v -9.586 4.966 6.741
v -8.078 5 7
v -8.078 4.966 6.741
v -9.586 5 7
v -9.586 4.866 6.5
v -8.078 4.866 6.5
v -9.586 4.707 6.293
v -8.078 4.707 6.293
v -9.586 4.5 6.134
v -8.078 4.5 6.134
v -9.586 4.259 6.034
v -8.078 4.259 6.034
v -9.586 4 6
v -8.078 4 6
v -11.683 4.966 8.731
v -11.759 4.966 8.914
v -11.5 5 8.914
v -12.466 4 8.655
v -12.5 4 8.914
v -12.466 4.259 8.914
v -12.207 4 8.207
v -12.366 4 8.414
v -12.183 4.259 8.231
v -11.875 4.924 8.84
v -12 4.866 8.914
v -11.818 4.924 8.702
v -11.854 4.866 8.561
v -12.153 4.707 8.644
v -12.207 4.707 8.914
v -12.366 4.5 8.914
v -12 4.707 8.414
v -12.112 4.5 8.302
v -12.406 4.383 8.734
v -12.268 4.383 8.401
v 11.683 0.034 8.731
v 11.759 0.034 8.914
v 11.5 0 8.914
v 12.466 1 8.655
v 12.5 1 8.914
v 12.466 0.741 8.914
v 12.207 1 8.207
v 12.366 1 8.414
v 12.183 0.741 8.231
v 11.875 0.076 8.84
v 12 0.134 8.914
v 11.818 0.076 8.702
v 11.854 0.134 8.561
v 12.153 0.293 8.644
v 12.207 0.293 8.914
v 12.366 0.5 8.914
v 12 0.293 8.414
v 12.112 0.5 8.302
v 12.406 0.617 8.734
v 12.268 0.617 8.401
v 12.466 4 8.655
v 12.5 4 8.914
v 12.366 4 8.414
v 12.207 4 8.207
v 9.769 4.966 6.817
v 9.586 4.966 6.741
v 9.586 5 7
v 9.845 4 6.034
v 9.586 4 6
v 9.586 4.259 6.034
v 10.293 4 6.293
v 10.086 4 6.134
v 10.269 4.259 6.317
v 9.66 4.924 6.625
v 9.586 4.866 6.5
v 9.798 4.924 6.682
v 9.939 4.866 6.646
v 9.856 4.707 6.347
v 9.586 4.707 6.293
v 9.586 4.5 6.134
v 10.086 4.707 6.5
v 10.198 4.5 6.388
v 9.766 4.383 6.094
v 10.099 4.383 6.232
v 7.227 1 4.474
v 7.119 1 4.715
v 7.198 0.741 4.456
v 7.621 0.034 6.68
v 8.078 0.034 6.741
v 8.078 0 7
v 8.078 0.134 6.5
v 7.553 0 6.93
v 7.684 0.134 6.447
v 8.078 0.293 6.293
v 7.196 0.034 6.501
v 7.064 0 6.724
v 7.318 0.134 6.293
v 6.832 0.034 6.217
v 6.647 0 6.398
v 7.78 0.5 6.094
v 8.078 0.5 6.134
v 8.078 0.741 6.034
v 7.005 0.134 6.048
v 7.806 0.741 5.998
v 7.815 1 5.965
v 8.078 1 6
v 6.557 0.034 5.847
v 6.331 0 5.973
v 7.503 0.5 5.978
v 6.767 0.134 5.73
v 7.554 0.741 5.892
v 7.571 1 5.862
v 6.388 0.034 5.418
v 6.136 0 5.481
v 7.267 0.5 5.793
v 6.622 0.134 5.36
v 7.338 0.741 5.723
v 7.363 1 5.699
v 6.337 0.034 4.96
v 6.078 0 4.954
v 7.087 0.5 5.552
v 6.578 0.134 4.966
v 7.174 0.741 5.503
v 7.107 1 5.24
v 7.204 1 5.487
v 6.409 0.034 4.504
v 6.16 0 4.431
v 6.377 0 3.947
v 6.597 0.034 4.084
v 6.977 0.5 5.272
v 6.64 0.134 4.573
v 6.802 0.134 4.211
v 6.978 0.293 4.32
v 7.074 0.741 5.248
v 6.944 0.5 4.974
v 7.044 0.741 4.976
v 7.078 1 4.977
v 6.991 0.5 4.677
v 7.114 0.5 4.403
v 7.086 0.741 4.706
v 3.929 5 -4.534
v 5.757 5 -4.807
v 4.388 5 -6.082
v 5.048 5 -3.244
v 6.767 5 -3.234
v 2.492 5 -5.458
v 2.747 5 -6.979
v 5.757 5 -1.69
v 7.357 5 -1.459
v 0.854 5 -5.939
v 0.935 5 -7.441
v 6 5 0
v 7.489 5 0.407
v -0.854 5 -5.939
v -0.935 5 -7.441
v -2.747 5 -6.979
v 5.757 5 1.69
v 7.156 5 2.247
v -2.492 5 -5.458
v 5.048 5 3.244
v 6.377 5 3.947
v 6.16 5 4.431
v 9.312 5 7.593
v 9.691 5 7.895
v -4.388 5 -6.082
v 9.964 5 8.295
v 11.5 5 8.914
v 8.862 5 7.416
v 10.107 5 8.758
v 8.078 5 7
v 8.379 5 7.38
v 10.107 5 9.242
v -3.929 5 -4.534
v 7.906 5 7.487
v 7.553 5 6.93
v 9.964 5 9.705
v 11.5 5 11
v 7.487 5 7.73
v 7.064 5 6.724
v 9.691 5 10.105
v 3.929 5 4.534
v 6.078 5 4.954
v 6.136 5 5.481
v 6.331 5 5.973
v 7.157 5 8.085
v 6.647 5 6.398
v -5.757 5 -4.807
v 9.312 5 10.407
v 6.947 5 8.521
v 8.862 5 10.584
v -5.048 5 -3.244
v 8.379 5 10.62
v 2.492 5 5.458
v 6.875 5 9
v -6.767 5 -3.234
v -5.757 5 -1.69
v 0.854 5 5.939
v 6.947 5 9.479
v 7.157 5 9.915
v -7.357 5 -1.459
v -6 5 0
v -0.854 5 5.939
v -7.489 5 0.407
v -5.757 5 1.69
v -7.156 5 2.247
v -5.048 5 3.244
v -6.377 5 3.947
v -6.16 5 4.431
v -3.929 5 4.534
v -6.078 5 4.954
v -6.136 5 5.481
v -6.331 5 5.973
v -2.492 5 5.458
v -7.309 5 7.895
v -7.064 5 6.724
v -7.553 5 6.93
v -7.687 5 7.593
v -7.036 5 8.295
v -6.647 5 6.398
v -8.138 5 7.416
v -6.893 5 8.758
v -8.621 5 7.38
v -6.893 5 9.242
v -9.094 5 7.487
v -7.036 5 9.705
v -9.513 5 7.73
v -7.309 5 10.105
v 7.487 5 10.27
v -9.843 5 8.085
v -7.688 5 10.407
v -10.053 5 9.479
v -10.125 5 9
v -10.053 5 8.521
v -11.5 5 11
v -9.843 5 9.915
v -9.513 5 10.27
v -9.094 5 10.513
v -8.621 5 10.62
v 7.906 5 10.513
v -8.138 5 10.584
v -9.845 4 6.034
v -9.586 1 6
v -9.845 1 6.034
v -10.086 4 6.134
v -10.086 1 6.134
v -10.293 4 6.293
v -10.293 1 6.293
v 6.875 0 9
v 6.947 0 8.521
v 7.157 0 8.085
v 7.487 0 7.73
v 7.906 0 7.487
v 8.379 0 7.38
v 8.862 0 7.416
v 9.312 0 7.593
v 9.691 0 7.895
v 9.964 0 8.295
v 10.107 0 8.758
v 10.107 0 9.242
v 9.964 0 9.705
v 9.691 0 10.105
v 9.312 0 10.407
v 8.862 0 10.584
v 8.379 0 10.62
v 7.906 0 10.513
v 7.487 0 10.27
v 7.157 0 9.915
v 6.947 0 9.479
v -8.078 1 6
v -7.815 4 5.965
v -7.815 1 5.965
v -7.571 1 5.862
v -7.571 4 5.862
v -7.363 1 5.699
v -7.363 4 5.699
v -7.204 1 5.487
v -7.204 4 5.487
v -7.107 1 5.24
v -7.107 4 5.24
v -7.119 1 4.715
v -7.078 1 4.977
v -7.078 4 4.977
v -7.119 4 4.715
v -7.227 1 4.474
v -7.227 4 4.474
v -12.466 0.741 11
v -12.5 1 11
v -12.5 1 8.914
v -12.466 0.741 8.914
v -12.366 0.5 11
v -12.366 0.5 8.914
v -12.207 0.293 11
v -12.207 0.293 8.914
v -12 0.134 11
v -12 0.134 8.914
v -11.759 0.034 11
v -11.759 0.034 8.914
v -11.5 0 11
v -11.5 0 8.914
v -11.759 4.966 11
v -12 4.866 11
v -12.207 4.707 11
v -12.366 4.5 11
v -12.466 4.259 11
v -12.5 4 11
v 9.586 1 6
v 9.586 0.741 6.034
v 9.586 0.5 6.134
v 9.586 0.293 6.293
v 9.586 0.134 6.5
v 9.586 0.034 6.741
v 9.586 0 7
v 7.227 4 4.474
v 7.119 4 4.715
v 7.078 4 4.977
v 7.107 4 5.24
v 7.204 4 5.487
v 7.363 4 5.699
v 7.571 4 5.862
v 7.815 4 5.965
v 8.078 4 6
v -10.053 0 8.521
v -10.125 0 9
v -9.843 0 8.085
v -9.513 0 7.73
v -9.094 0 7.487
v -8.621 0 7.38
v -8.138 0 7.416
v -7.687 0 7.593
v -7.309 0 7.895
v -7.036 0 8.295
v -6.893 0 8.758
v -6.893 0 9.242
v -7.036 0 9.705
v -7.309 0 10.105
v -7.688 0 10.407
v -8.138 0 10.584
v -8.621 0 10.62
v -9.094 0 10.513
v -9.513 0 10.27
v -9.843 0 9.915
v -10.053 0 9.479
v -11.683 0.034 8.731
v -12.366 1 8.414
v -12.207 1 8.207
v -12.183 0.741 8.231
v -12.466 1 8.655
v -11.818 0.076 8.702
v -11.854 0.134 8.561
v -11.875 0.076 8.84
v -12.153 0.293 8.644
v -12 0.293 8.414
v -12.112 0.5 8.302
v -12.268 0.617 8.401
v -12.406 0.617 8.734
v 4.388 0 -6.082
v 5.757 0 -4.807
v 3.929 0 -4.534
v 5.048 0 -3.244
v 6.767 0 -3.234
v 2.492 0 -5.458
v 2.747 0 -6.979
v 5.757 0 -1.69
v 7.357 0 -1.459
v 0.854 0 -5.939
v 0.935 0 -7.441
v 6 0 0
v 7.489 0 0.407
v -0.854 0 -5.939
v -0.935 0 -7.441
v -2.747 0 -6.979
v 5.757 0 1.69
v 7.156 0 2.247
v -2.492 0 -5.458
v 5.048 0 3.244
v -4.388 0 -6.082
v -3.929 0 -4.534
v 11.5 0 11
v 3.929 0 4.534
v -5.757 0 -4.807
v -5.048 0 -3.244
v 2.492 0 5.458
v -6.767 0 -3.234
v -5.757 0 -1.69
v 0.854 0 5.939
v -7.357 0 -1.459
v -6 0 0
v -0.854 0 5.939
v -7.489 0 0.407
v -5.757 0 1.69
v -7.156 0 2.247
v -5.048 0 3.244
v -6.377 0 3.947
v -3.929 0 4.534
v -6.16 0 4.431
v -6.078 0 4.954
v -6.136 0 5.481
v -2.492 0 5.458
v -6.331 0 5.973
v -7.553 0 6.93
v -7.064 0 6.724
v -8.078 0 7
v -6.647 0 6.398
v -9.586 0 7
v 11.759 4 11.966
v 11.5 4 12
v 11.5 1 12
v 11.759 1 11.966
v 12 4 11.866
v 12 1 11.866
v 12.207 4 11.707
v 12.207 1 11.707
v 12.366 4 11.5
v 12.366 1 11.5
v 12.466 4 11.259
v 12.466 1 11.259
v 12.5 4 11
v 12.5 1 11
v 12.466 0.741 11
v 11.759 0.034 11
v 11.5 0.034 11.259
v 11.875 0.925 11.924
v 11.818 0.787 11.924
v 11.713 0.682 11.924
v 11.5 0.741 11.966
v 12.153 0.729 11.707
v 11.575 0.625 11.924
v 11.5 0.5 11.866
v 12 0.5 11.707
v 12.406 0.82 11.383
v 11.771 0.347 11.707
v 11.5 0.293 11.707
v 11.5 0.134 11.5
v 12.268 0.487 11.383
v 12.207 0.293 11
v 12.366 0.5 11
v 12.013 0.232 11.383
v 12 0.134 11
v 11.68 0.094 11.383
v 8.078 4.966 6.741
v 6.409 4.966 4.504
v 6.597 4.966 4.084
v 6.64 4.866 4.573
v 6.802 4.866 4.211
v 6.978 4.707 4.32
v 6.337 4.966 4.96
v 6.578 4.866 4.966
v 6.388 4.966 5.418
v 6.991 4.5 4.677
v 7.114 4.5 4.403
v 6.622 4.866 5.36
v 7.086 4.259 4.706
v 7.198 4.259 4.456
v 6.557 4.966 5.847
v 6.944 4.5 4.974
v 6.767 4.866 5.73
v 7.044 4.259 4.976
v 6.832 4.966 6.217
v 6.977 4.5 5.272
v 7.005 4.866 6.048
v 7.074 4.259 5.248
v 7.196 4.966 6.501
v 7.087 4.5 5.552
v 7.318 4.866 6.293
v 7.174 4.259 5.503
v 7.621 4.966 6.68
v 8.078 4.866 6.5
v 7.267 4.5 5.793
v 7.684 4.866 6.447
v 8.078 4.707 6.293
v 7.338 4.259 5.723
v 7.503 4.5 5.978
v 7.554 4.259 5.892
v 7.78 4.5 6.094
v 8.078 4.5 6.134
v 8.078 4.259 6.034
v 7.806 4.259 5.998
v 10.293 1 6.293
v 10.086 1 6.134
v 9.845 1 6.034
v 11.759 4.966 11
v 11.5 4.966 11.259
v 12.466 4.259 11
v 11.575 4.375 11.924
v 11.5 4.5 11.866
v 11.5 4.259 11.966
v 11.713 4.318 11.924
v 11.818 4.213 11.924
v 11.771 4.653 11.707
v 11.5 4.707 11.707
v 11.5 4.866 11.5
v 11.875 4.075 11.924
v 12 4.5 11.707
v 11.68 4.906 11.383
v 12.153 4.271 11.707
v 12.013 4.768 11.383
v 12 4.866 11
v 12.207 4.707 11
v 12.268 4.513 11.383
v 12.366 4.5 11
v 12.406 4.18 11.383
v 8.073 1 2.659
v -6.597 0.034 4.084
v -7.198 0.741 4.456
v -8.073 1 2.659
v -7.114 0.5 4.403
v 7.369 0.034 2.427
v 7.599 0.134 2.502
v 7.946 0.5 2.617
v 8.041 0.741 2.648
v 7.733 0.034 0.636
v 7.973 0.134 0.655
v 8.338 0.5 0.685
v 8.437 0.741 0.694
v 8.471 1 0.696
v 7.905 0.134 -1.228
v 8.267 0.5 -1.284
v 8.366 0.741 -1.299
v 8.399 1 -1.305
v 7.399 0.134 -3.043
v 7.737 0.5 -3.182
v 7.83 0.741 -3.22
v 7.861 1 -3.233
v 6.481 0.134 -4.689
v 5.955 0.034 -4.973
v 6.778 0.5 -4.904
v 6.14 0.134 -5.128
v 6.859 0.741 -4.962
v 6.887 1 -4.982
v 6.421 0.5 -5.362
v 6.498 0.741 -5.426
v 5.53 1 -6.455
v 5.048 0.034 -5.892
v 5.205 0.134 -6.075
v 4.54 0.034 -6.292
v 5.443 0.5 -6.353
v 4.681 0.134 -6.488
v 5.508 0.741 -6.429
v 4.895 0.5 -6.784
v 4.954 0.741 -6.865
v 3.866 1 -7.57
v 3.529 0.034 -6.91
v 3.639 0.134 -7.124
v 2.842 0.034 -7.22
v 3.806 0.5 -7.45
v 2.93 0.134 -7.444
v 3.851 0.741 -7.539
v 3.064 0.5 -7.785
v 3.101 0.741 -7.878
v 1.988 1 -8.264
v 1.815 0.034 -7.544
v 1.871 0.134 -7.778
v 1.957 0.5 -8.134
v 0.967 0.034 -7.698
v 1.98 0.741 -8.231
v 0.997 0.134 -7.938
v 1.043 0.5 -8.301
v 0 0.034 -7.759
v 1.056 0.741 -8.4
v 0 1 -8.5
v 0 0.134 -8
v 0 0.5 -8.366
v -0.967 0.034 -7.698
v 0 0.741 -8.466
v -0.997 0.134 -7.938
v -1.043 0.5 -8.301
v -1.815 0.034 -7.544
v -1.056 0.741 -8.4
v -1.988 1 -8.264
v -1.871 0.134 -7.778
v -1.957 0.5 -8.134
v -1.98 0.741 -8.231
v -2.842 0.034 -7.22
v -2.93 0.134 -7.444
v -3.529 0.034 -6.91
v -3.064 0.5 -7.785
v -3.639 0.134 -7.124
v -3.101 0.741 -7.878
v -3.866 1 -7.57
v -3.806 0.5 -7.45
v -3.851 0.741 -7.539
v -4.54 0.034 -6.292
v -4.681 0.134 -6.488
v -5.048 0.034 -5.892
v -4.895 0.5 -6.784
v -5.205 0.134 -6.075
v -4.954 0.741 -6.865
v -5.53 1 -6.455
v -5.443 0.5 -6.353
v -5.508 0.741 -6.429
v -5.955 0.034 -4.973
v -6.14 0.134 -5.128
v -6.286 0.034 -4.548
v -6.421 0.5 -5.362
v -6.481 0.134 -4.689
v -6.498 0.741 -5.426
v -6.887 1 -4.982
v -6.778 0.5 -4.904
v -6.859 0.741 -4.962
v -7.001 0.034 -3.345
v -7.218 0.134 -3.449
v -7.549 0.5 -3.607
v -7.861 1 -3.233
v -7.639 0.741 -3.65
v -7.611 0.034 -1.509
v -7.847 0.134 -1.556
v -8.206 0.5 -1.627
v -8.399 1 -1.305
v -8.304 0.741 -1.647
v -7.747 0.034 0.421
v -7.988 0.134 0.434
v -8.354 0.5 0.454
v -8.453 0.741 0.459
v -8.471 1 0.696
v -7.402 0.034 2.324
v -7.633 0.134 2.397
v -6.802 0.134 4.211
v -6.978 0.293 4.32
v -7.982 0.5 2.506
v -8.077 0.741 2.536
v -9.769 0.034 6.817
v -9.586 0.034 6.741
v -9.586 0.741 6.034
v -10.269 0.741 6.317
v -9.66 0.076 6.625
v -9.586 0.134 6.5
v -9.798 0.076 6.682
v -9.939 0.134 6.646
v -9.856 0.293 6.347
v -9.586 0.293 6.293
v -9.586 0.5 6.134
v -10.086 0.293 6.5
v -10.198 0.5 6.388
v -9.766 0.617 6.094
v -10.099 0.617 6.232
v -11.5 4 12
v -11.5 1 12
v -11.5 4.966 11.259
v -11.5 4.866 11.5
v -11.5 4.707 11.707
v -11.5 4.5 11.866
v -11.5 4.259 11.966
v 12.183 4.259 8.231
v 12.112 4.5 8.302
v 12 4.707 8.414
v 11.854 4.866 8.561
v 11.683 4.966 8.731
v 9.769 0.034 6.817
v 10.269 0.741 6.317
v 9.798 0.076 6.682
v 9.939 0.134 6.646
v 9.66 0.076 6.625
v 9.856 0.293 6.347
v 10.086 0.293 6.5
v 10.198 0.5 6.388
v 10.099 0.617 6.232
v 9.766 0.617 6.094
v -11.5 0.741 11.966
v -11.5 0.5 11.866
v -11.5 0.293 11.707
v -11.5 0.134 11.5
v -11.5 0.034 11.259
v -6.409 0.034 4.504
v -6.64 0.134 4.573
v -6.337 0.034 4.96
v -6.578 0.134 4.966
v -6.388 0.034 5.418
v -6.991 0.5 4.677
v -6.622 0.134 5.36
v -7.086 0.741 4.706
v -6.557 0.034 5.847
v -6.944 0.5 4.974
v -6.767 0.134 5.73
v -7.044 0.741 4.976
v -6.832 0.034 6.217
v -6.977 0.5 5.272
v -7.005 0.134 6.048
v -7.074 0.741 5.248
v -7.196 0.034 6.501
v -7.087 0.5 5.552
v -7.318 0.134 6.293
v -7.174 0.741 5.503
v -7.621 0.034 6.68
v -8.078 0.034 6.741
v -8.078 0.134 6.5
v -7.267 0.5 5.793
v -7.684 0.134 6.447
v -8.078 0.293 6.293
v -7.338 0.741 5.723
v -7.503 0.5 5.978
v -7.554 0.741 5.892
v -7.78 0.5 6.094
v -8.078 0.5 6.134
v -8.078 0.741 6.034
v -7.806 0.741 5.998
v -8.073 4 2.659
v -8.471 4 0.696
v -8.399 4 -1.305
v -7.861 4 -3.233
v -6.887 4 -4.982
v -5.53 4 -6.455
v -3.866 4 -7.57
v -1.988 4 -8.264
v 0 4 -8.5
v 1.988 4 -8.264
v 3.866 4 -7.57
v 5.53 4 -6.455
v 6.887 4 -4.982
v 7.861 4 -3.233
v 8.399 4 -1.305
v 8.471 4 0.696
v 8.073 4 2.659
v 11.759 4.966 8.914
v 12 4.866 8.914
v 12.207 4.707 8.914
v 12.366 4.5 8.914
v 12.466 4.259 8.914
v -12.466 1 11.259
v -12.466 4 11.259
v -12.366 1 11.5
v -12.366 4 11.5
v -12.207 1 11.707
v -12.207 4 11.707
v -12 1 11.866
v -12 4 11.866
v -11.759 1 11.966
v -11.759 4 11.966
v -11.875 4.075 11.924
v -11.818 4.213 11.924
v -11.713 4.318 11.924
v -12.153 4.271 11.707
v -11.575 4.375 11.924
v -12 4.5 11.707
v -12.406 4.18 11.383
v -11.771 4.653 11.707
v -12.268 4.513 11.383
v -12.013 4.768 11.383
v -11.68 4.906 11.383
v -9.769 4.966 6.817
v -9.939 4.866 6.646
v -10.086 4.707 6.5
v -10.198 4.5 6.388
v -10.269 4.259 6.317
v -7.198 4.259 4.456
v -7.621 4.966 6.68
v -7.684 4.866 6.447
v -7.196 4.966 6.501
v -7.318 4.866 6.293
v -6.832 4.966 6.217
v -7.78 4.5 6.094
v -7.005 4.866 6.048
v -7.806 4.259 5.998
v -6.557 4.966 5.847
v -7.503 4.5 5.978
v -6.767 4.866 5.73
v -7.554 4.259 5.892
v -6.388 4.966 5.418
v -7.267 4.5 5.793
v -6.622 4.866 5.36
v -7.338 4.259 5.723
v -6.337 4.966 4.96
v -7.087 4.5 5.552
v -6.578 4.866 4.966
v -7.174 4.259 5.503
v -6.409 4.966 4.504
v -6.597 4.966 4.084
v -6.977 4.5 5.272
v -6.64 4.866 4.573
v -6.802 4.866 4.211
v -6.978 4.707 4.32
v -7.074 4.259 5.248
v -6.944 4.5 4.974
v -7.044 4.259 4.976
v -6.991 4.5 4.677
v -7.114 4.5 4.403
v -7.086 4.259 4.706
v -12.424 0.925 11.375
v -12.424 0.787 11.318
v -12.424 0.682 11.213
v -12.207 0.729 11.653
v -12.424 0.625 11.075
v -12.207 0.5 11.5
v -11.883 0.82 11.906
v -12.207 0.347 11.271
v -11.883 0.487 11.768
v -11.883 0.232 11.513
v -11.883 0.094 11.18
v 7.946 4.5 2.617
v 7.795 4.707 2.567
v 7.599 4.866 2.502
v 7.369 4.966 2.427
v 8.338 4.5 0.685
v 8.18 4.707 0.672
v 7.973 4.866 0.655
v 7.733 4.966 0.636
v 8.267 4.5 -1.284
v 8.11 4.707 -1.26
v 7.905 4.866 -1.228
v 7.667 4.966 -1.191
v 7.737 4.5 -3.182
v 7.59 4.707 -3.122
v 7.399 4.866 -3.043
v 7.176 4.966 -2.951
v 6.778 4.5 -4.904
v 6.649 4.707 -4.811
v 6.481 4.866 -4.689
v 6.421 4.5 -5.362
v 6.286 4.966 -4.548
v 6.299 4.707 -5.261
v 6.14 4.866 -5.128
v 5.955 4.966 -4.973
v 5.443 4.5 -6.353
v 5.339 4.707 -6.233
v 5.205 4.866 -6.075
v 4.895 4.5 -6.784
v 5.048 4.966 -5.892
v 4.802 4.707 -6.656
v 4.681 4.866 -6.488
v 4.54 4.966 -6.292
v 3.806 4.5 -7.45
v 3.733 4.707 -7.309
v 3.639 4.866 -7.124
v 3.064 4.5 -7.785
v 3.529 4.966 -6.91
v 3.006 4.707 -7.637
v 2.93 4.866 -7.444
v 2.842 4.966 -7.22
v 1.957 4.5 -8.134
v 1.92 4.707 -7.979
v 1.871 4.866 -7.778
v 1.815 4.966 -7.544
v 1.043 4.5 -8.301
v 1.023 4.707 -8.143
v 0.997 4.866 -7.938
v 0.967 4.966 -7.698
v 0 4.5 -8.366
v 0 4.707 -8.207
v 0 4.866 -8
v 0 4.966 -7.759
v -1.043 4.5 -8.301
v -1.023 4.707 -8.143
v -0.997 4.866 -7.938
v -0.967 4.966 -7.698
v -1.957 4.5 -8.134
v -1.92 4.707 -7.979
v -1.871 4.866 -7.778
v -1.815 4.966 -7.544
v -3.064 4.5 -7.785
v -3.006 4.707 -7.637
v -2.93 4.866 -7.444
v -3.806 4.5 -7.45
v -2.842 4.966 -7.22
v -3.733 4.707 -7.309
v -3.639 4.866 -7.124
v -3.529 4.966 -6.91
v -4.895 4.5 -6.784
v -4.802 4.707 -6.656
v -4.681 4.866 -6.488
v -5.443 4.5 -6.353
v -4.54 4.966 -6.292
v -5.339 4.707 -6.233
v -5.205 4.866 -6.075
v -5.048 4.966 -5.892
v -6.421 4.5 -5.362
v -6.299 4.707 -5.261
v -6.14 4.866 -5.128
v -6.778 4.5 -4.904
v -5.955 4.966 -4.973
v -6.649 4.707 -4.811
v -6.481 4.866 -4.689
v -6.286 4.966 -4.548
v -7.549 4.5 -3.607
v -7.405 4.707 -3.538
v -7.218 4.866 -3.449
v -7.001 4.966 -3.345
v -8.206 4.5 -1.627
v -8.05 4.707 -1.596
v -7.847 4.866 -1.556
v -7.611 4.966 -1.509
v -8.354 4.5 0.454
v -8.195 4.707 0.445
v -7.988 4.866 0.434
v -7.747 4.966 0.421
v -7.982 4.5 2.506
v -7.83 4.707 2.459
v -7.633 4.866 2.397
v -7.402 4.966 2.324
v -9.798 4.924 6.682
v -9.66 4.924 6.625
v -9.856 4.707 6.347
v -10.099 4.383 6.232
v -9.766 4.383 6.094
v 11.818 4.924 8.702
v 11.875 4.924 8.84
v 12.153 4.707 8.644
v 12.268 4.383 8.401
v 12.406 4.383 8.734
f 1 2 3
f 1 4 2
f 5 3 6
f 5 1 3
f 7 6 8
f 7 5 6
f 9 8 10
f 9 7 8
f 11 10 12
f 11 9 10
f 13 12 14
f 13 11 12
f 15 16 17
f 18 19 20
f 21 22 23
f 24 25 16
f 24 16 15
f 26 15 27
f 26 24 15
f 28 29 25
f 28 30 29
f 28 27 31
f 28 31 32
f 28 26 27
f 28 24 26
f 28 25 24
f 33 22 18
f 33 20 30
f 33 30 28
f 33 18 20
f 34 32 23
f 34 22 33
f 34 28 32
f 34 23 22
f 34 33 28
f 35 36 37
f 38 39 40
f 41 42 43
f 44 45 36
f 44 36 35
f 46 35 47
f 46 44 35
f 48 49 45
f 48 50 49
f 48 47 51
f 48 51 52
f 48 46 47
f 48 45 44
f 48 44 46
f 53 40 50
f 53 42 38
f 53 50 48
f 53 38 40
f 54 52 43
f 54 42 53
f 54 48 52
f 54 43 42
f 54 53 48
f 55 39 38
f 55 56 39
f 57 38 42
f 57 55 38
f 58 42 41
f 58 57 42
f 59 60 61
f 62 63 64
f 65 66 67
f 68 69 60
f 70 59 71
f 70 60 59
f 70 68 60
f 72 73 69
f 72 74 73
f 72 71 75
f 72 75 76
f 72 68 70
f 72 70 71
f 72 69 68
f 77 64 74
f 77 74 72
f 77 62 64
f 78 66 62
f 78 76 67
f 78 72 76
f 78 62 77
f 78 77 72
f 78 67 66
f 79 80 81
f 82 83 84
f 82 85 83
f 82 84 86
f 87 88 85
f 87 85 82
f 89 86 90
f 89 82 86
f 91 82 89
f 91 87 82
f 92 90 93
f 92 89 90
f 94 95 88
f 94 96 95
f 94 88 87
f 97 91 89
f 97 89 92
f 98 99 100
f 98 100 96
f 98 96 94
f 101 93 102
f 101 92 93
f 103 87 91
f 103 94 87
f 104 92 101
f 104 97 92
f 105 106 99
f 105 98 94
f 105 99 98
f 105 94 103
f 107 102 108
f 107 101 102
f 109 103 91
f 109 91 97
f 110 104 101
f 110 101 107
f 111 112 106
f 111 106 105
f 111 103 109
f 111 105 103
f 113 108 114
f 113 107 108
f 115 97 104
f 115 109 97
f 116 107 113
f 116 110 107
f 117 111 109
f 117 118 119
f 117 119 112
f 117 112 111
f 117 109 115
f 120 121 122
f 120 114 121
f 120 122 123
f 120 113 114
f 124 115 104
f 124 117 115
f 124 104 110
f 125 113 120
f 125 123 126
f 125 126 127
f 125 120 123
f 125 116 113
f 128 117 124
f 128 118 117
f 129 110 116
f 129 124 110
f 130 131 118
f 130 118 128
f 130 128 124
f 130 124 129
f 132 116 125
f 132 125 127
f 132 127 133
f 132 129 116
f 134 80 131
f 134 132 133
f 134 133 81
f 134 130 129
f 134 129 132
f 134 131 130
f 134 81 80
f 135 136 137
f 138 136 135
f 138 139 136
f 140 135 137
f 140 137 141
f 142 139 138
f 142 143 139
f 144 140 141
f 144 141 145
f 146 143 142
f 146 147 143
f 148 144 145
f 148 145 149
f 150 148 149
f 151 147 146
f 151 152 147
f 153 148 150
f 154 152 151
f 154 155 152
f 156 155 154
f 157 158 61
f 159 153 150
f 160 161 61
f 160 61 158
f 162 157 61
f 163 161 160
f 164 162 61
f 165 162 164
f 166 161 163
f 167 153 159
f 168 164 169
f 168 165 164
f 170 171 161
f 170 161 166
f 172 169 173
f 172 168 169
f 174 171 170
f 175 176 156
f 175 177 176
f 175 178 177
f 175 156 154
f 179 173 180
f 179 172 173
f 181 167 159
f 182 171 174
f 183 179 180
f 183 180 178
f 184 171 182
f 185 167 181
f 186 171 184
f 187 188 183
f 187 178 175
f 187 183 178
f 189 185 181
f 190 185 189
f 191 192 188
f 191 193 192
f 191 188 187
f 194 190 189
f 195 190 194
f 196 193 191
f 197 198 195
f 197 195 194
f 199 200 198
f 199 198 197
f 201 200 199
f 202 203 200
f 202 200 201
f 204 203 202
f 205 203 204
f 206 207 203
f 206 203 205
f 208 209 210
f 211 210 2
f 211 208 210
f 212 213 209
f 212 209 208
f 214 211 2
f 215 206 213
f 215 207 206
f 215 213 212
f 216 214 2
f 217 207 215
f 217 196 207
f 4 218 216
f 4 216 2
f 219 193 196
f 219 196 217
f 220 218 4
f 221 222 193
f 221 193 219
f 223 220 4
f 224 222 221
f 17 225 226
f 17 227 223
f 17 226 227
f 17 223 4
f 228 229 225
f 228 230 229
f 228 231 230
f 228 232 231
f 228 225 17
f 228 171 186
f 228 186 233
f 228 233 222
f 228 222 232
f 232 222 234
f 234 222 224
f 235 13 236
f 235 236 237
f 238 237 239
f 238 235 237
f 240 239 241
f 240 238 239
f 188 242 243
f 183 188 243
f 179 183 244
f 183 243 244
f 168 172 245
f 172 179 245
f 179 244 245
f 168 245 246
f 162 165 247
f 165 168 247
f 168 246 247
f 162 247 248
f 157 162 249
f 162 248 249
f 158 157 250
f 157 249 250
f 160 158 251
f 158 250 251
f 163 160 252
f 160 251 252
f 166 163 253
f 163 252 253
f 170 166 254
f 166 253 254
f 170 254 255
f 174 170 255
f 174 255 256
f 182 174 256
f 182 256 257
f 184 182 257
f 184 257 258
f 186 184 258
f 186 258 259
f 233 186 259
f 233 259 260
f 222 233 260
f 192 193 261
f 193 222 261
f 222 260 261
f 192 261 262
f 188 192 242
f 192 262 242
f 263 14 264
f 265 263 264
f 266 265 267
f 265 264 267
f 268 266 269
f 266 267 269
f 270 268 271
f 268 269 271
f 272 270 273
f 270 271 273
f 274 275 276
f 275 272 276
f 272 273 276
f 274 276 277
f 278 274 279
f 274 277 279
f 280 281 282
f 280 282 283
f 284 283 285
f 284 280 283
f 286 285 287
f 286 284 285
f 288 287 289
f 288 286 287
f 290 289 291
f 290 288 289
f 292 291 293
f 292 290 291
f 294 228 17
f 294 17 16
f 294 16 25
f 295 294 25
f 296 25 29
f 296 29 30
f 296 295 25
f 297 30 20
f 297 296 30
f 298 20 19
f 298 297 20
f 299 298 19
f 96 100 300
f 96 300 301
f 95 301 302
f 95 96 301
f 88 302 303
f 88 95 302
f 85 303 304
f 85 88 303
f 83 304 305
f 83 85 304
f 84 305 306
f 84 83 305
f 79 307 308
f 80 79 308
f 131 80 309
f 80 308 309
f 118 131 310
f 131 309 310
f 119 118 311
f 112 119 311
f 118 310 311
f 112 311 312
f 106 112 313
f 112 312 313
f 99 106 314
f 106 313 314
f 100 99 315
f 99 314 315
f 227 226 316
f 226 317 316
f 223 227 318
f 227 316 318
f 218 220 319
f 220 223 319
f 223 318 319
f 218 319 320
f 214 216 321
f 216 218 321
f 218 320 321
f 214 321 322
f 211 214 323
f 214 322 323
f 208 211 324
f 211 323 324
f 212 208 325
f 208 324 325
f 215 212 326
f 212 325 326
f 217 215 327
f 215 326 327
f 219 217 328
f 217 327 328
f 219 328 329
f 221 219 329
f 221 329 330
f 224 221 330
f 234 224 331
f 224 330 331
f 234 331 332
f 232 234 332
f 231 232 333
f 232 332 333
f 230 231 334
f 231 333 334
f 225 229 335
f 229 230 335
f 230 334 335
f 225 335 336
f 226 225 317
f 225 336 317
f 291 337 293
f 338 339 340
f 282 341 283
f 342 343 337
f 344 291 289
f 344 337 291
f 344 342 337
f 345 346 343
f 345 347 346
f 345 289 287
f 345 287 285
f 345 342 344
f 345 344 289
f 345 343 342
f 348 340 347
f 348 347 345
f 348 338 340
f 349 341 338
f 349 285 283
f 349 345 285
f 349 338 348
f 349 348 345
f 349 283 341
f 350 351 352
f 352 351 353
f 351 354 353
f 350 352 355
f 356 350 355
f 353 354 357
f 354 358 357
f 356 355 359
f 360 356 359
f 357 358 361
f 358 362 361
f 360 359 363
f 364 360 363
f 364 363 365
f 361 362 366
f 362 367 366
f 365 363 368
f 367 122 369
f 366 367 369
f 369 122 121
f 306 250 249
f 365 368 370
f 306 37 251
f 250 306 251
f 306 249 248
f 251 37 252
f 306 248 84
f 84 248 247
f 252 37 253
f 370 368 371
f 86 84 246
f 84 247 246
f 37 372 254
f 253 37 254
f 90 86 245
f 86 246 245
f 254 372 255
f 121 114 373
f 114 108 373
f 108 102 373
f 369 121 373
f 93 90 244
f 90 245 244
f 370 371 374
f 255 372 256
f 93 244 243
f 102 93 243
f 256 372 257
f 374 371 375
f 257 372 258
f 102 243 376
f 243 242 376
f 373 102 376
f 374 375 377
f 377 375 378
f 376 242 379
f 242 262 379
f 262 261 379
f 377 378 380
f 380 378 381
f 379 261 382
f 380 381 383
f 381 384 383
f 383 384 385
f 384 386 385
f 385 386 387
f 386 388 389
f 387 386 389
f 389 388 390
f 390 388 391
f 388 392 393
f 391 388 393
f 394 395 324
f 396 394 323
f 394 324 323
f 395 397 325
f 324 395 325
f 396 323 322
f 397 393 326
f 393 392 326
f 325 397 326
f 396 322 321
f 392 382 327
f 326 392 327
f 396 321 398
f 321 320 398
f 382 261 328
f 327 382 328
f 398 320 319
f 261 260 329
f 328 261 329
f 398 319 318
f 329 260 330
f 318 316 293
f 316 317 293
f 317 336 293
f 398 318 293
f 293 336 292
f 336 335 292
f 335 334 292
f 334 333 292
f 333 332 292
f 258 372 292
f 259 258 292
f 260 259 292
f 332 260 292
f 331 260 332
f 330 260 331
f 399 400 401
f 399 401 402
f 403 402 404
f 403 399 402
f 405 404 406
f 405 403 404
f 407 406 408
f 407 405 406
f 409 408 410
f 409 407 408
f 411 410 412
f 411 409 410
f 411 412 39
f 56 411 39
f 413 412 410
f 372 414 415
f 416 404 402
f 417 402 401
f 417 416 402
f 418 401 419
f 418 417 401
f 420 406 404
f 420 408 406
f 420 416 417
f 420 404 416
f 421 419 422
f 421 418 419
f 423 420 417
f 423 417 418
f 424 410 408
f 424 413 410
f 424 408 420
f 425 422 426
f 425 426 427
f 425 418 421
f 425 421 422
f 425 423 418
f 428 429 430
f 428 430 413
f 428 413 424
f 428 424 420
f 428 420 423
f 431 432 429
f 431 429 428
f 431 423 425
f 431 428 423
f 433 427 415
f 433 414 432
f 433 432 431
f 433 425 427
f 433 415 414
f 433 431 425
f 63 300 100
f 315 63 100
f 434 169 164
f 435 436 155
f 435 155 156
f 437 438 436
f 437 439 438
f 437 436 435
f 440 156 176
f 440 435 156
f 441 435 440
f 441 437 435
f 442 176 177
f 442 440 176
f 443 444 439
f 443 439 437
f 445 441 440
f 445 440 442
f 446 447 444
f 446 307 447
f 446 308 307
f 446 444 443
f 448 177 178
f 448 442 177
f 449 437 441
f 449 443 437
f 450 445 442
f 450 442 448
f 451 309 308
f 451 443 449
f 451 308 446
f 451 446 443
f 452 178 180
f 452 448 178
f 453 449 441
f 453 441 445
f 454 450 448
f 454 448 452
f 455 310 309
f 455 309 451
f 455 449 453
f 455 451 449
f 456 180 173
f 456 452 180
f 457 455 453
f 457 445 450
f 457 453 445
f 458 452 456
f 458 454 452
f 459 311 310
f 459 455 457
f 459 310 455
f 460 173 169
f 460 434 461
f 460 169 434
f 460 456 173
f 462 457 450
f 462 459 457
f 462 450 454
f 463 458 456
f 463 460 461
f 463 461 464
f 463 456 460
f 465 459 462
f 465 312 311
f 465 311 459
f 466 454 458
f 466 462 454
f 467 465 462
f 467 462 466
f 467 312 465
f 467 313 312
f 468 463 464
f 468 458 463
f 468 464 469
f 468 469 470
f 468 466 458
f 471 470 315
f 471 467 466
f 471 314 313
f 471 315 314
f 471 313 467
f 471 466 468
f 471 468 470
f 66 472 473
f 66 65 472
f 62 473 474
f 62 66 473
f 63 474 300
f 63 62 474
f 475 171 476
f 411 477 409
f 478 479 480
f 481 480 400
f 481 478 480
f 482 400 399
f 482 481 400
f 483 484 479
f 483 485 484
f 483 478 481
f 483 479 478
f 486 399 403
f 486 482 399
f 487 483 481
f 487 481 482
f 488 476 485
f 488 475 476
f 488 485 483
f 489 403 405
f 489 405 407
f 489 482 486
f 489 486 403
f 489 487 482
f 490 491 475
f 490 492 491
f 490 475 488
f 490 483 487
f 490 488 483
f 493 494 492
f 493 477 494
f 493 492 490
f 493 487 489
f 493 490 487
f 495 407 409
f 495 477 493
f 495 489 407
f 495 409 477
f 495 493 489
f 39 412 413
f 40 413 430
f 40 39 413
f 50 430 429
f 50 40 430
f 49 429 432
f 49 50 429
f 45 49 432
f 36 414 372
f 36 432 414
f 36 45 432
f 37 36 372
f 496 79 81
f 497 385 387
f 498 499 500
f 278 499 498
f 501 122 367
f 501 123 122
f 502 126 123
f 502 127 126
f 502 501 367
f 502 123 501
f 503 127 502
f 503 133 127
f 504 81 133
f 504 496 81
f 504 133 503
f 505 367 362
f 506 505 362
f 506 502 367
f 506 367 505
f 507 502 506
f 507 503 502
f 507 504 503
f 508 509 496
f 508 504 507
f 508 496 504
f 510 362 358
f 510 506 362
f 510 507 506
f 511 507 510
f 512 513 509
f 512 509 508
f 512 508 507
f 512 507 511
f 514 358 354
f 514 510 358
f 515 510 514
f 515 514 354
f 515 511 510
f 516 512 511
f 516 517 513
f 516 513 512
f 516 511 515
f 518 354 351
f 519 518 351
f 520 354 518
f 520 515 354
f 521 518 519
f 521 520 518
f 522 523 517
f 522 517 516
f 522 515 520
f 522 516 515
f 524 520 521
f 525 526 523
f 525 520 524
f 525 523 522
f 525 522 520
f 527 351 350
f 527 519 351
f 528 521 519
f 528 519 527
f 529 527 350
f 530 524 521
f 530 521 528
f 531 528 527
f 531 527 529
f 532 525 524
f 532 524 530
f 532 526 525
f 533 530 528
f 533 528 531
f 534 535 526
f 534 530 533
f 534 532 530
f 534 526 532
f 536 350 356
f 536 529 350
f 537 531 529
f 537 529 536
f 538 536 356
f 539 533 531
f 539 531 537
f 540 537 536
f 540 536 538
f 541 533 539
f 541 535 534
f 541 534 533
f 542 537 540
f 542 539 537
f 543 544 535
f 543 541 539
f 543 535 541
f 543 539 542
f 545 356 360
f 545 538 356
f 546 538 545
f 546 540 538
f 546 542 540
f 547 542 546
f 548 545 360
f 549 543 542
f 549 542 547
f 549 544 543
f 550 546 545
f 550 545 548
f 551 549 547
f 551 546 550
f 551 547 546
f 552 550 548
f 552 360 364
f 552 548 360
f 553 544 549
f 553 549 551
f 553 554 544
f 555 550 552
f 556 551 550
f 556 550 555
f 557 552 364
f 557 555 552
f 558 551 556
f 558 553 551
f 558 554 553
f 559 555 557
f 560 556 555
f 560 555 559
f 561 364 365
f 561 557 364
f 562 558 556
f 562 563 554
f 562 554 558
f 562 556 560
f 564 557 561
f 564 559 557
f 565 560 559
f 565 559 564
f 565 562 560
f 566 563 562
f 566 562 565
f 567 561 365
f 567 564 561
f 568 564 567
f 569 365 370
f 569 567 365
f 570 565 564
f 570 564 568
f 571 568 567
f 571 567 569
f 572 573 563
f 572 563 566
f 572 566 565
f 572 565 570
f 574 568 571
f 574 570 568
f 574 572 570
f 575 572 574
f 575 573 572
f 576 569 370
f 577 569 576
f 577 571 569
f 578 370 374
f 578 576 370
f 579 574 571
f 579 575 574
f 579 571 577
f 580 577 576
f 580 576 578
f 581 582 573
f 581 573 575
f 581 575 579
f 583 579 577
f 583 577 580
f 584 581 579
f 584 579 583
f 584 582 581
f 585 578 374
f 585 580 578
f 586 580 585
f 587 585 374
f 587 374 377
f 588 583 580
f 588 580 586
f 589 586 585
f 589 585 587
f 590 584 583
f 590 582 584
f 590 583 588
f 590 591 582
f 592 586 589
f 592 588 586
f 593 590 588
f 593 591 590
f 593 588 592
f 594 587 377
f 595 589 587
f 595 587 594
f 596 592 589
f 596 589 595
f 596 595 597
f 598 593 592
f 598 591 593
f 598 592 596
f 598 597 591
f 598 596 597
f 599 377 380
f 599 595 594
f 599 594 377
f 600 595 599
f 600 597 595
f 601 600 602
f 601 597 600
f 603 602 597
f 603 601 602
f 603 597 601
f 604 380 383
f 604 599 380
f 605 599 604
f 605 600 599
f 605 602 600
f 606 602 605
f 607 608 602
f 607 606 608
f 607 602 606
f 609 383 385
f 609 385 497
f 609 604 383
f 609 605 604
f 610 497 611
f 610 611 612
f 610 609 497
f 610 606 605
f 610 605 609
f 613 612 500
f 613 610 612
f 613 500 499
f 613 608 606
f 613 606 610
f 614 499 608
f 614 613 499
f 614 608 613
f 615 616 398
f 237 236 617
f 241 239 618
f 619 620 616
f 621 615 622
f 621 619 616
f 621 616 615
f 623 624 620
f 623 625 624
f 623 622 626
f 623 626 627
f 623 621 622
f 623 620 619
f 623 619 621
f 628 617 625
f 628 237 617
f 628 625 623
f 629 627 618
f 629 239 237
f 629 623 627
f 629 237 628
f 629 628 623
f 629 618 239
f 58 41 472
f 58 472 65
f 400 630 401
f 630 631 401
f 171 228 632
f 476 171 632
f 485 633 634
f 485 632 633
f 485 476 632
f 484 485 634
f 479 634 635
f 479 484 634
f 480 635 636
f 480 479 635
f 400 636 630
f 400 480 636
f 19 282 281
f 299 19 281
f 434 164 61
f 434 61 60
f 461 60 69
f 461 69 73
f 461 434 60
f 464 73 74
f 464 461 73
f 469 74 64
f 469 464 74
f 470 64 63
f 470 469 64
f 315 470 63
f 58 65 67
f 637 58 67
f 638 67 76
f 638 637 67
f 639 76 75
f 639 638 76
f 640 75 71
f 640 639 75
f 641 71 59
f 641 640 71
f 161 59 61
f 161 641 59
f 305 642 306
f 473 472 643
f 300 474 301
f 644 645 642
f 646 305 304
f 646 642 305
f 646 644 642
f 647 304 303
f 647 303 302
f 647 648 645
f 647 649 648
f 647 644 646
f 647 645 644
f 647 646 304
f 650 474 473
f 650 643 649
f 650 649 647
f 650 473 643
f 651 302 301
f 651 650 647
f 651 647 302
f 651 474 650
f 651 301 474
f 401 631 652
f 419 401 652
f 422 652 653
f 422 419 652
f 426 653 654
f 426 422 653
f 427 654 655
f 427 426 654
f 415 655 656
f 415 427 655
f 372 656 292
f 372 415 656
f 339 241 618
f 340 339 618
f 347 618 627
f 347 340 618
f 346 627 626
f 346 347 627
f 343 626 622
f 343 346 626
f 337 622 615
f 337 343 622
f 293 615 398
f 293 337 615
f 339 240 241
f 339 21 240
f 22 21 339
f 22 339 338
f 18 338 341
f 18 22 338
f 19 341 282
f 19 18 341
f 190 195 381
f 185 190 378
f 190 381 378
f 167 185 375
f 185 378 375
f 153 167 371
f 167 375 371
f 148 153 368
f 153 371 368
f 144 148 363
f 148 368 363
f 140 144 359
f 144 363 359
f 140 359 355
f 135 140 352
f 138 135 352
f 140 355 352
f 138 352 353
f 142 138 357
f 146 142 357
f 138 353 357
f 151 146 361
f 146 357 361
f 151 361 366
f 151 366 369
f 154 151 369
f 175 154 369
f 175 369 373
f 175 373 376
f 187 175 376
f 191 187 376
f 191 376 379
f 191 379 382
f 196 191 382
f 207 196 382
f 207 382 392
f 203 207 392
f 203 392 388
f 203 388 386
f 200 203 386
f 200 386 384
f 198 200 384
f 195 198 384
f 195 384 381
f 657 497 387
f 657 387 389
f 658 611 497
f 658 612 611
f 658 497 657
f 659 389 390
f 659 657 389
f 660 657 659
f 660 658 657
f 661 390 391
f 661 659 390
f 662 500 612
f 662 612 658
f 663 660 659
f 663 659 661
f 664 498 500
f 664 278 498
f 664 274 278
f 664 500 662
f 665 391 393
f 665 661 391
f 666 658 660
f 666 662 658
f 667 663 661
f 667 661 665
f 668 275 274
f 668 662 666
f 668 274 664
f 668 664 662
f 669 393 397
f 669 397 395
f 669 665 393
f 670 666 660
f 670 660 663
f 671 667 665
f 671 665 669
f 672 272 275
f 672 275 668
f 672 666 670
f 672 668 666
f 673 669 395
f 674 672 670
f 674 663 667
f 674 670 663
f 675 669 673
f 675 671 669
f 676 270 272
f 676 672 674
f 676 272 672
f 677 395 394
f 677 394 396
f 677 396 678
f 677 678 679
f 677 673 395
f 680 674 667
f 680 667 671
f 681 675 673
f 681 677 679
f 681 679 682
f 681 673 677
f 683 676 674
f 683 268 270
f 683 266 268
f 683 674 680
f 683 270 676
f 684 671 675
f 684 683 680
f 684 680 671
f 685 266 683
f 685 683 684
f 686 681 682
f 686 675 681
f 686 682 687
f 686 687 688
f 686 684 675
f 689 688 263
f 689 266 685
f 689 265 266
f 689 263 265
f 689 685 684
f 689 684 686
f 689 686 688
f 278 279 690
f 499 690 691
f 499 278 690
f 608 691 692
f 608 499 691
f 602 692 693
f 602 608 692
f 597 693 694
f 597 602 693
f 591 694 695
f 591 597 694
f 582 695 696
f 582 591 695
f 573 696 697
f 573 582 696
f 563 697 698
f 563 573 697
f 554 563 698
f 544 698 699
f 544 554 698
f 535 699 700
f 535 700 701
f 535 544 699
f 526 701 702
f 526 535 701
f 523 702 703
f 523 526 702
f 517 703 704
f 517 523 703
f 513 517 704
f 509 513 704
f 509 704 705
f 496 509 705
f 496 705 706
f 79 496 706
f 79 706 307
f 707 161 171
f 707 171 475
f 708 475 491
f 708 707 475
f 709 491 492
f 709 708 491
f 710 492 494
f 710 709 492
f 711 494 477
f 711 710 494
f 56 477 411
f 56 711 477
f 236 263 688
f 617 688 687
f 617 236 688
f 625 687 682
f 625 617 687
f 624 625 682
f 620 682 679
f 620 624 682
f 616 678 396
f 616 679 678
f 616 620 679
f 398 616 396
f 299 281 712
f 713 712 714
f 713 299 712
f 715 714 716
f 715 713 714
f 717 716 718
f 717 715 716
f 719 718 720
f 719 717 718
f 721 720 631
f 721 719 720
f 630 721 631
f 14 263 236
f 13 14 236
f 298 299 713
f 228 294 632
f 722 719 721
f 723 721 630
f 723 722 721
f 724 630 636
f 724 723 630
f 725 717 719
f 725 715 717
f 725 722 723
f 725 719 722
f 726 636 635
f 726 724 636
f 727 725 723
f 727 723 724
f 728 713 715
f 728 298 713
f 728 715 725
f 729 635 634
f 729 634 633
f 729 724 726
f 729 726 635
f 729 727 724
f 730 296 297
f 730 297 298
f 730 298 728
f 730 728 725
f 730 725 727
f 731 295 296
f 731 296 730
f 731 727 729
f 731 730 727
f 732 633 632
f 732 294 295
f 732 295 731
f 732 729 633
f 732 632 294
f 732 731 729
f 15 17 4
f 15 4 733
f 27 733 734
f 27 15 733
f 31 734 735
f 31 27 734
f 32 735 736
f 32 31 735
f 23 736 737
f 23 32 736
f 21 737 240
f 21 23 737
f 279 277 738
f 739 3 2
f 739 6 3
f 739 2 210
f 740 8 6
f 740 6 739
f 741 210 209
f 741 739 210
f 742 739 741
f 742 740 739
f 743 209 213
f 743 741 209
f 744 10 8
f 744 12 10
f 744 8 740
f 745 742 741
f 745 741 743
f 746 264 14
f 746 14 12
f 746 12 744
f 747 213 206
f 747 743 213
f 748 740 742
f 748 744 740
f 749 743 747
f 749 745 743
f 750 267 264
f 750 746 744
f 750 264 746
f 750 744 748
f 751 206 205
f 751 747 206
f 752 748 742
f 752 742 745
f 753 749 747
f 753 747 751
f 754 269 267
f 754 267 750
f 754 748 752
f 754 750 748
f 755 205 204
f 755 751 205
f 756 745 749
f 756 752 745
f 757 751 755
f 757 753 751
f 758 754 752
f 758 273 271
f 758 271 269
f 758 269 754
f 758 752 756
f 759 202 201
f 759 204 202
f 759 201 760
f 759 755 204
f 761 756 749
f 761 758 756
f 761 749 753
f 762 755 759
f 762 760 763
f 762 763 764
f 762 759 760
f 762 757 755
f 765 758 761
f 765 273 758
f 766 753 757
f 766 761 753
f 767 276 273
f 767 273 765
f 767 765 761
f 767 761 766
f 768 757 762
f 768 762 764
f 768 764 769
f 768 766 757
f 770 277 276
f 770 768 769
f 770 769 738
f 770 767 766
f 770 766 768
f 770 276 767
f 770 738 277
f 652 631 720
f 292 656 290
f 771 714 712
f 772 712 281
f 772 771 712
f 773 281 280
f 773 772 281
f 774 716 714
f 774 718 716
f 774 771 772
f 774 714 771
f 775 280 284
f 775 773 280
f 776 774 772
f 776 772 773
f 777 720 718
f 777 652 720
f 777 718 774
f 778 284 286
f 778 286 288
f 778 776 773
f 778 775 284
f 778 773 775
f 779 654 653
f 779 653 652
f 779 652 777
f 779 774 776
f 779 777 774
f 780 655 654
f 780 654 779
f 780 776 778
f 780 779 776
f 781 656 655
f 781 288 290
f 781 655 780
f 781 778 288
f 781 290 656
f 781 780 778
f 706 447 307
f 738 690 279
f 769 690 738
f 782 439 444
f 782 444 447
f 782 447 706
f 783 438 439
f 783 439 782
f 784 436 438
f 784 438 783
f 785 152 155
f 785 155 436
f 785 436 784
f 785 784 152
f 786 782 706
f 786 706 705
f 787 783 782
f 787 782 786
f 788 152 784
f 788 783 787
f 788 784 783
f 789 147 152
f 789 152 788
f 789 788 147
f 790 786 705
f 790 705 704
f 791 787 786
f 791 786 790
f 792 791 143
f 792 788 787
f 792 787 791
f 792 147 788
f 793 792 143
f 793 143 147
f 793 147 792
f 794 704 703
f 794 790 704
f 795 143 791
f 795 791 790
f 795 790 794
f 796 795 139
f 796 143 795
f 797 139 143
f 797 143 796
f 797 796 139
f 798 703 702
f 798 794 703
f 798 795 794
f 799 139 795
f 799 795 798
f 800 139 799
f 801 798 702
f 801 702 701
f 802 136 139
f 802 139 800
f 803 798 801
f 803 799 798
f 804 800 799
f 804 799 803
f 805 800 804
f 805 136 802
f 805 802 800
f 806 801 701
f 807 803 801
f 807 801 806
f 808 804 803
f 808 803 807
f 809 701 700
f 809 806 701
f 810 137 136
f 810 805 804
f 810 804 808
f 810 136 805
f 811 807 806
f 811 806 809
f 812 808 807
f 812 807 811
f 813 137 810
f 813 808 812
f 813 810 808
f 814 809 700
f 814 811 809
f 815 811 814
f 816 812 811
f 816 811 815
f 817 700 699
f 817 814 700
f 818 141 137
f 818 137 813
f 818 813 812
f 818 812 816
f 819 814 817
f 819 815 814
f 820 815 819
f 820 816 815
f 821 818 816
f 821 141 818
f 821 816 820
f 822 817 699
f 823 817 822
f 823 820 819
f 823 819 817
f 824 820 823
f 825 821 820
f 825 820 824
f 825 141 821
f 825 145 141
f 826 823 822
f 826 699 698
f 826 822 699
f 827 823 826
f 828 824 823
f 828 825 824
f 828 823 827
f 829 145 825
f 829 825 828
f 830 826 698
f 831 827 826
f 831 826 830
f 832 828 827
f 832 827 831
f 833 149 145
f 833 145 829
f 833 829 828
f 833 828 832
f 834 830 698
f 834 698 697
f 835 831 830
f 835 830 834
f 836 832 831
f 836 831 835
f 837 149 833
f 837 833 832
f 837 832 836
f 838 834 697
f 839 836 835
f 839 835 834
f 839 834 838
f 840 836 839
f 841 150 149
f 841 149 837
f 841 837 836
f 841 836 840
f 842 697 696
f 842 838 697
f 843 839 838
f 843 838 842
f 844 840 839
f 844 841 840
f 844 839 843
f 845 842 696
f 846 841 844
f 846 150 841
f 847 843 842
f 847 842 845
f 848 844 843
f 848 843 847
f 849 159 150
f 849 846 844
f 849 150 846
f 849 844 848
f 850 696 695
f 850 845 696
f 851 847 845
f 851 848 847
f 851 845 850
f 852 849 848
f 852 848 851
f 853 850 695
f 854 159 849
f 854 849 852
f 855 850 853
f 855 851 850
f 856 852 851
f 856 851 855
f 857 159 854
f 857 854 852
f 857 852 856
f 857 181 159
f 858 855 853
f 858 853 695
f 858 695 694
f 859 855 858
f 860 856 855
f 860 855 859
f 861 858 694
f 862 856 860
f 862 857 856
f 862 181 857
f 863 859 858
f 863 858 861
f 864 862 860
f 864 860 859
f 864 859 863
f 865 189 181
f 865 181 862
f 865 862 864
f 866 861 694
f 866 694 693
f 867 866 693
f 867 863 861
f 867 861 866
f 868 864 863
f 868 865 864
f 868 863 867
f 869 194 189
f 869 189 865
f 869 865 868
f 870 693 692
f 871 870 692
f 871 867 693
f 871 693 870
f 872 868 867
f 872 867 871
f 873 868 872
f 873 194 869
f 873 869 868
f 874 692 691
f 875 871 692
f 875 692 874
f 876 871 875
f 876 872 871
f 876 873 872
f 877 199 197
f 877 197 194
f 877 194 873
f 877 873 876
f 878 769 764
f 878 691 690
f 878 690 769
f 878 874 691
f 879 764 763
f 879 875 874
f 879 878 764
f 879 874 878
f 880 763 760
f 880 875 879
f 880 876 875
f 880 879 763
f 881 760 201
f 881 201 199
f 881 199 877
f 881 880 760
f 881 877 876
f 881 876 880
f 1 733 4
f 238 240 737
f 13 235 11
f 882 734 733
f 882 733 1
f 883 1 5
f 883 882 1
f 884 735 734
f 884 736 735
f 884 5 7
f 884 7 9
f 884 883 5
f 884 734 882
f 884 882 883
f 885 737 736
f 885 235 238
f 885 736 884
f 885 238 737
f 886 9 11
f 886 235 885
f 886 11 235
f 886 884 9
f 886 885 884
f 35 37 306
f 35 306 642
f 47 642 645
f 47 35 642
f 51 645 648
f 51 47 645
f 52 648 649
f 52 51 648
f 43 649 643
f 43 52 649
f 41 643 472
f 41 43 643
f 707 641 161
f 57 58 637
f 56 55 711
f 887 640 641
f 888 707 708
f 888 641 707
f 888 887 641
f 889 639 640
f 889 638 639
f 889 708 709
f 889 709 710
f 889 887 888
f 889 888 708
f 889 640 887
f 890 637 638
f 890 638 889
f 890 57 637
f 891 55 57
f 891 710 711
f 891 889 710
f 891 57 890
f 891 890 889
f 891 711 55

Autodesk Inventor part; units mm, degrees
ref_plane "YZ Plane" through (0, 0, 0) normal (1, 0, 0) x (0, 1, 0)
ref_plane "XZ Plane" through (0, 0, 0) normal (0, 1, 0) x (-1, 0, 0)
ref_plane "XY Plane" through (0, 0, 0) normal (0, 0, 1) x (1, 0, 0)
sketch "Sketch1" plane through (0, 0, 0) normal (0, 1, 0) x (-1, 0, 0)
  circle A0 centre (0, 0) radius 6
  circle A1 centre (0, 0) radius 8.5
  line L0 (12.5, 12) -> (-12.5, 12)
  line L1 (-12.5, 12) -> (-12.5, 6)
  line L2 (-12.5, 6) -> (12.5, 6)
  line L3 (12.5, 6) -> (12.5, 12)
  line L4 (12.5, 9) -> (-12.5, 9) construction
  circle A2 centre (8.5, 9) radius 1.625
  circle A3 centre (-8.5, 9) radius 1.625
  dimension "d0" = 12
  dimension "d1" = 17
  dimension "d2" = 25
  dimension "d3" = 6
  dimension "d4" = 12.5
  dimension "d5" = 3.25
  dimension "d6" = 3.25
  dimension "d7" = 17
  dimension "d8" = 4
extrude "Extrusion1" add sketch "Sketch1" along normal blind 5
chamfer "Chamfer2" distance 2.5 angle 45 2 edges at (-12.5, 2.5, 6) (12.5, 2.5, 6)
fillet "Fillet3" radius 1 24 edges at (8.0104, 0, 6) (11.25, 0, 7.25) (12.5, 0, 10.25) (0, 0, 12) (-12.5, 0, 10.25) (-8.0104, 0, 6) (-10, 2.5, 6) (-12.5, 5, 10.25) (-12.5, 2.5, 8.5) (-11.25, 5, 7.25) (-8.0104, 5, 6) (-11.25, 0, 7.25) (-6.0208, 2.5, 6) (6.0208, 2.5, 6) (0, 0, -8.5) (0, 5, -8.5) (8.0104, 5, 6) (10, 2.5, 6) (11.25, 5, 7.25) (12.5, 5, 10.25) (0, 5, 12) (-12.5, 2.5, 12) (12.5, 2.5, 8.5) (12.5, 2.5, 12)
equation "\"d4\" = 0.5 * d2"
equation "\"d8\" = -0.5 * d7 + 0.5 * d2"
properties part number "proxymity_holder_v2" material "ABS Plastic"
